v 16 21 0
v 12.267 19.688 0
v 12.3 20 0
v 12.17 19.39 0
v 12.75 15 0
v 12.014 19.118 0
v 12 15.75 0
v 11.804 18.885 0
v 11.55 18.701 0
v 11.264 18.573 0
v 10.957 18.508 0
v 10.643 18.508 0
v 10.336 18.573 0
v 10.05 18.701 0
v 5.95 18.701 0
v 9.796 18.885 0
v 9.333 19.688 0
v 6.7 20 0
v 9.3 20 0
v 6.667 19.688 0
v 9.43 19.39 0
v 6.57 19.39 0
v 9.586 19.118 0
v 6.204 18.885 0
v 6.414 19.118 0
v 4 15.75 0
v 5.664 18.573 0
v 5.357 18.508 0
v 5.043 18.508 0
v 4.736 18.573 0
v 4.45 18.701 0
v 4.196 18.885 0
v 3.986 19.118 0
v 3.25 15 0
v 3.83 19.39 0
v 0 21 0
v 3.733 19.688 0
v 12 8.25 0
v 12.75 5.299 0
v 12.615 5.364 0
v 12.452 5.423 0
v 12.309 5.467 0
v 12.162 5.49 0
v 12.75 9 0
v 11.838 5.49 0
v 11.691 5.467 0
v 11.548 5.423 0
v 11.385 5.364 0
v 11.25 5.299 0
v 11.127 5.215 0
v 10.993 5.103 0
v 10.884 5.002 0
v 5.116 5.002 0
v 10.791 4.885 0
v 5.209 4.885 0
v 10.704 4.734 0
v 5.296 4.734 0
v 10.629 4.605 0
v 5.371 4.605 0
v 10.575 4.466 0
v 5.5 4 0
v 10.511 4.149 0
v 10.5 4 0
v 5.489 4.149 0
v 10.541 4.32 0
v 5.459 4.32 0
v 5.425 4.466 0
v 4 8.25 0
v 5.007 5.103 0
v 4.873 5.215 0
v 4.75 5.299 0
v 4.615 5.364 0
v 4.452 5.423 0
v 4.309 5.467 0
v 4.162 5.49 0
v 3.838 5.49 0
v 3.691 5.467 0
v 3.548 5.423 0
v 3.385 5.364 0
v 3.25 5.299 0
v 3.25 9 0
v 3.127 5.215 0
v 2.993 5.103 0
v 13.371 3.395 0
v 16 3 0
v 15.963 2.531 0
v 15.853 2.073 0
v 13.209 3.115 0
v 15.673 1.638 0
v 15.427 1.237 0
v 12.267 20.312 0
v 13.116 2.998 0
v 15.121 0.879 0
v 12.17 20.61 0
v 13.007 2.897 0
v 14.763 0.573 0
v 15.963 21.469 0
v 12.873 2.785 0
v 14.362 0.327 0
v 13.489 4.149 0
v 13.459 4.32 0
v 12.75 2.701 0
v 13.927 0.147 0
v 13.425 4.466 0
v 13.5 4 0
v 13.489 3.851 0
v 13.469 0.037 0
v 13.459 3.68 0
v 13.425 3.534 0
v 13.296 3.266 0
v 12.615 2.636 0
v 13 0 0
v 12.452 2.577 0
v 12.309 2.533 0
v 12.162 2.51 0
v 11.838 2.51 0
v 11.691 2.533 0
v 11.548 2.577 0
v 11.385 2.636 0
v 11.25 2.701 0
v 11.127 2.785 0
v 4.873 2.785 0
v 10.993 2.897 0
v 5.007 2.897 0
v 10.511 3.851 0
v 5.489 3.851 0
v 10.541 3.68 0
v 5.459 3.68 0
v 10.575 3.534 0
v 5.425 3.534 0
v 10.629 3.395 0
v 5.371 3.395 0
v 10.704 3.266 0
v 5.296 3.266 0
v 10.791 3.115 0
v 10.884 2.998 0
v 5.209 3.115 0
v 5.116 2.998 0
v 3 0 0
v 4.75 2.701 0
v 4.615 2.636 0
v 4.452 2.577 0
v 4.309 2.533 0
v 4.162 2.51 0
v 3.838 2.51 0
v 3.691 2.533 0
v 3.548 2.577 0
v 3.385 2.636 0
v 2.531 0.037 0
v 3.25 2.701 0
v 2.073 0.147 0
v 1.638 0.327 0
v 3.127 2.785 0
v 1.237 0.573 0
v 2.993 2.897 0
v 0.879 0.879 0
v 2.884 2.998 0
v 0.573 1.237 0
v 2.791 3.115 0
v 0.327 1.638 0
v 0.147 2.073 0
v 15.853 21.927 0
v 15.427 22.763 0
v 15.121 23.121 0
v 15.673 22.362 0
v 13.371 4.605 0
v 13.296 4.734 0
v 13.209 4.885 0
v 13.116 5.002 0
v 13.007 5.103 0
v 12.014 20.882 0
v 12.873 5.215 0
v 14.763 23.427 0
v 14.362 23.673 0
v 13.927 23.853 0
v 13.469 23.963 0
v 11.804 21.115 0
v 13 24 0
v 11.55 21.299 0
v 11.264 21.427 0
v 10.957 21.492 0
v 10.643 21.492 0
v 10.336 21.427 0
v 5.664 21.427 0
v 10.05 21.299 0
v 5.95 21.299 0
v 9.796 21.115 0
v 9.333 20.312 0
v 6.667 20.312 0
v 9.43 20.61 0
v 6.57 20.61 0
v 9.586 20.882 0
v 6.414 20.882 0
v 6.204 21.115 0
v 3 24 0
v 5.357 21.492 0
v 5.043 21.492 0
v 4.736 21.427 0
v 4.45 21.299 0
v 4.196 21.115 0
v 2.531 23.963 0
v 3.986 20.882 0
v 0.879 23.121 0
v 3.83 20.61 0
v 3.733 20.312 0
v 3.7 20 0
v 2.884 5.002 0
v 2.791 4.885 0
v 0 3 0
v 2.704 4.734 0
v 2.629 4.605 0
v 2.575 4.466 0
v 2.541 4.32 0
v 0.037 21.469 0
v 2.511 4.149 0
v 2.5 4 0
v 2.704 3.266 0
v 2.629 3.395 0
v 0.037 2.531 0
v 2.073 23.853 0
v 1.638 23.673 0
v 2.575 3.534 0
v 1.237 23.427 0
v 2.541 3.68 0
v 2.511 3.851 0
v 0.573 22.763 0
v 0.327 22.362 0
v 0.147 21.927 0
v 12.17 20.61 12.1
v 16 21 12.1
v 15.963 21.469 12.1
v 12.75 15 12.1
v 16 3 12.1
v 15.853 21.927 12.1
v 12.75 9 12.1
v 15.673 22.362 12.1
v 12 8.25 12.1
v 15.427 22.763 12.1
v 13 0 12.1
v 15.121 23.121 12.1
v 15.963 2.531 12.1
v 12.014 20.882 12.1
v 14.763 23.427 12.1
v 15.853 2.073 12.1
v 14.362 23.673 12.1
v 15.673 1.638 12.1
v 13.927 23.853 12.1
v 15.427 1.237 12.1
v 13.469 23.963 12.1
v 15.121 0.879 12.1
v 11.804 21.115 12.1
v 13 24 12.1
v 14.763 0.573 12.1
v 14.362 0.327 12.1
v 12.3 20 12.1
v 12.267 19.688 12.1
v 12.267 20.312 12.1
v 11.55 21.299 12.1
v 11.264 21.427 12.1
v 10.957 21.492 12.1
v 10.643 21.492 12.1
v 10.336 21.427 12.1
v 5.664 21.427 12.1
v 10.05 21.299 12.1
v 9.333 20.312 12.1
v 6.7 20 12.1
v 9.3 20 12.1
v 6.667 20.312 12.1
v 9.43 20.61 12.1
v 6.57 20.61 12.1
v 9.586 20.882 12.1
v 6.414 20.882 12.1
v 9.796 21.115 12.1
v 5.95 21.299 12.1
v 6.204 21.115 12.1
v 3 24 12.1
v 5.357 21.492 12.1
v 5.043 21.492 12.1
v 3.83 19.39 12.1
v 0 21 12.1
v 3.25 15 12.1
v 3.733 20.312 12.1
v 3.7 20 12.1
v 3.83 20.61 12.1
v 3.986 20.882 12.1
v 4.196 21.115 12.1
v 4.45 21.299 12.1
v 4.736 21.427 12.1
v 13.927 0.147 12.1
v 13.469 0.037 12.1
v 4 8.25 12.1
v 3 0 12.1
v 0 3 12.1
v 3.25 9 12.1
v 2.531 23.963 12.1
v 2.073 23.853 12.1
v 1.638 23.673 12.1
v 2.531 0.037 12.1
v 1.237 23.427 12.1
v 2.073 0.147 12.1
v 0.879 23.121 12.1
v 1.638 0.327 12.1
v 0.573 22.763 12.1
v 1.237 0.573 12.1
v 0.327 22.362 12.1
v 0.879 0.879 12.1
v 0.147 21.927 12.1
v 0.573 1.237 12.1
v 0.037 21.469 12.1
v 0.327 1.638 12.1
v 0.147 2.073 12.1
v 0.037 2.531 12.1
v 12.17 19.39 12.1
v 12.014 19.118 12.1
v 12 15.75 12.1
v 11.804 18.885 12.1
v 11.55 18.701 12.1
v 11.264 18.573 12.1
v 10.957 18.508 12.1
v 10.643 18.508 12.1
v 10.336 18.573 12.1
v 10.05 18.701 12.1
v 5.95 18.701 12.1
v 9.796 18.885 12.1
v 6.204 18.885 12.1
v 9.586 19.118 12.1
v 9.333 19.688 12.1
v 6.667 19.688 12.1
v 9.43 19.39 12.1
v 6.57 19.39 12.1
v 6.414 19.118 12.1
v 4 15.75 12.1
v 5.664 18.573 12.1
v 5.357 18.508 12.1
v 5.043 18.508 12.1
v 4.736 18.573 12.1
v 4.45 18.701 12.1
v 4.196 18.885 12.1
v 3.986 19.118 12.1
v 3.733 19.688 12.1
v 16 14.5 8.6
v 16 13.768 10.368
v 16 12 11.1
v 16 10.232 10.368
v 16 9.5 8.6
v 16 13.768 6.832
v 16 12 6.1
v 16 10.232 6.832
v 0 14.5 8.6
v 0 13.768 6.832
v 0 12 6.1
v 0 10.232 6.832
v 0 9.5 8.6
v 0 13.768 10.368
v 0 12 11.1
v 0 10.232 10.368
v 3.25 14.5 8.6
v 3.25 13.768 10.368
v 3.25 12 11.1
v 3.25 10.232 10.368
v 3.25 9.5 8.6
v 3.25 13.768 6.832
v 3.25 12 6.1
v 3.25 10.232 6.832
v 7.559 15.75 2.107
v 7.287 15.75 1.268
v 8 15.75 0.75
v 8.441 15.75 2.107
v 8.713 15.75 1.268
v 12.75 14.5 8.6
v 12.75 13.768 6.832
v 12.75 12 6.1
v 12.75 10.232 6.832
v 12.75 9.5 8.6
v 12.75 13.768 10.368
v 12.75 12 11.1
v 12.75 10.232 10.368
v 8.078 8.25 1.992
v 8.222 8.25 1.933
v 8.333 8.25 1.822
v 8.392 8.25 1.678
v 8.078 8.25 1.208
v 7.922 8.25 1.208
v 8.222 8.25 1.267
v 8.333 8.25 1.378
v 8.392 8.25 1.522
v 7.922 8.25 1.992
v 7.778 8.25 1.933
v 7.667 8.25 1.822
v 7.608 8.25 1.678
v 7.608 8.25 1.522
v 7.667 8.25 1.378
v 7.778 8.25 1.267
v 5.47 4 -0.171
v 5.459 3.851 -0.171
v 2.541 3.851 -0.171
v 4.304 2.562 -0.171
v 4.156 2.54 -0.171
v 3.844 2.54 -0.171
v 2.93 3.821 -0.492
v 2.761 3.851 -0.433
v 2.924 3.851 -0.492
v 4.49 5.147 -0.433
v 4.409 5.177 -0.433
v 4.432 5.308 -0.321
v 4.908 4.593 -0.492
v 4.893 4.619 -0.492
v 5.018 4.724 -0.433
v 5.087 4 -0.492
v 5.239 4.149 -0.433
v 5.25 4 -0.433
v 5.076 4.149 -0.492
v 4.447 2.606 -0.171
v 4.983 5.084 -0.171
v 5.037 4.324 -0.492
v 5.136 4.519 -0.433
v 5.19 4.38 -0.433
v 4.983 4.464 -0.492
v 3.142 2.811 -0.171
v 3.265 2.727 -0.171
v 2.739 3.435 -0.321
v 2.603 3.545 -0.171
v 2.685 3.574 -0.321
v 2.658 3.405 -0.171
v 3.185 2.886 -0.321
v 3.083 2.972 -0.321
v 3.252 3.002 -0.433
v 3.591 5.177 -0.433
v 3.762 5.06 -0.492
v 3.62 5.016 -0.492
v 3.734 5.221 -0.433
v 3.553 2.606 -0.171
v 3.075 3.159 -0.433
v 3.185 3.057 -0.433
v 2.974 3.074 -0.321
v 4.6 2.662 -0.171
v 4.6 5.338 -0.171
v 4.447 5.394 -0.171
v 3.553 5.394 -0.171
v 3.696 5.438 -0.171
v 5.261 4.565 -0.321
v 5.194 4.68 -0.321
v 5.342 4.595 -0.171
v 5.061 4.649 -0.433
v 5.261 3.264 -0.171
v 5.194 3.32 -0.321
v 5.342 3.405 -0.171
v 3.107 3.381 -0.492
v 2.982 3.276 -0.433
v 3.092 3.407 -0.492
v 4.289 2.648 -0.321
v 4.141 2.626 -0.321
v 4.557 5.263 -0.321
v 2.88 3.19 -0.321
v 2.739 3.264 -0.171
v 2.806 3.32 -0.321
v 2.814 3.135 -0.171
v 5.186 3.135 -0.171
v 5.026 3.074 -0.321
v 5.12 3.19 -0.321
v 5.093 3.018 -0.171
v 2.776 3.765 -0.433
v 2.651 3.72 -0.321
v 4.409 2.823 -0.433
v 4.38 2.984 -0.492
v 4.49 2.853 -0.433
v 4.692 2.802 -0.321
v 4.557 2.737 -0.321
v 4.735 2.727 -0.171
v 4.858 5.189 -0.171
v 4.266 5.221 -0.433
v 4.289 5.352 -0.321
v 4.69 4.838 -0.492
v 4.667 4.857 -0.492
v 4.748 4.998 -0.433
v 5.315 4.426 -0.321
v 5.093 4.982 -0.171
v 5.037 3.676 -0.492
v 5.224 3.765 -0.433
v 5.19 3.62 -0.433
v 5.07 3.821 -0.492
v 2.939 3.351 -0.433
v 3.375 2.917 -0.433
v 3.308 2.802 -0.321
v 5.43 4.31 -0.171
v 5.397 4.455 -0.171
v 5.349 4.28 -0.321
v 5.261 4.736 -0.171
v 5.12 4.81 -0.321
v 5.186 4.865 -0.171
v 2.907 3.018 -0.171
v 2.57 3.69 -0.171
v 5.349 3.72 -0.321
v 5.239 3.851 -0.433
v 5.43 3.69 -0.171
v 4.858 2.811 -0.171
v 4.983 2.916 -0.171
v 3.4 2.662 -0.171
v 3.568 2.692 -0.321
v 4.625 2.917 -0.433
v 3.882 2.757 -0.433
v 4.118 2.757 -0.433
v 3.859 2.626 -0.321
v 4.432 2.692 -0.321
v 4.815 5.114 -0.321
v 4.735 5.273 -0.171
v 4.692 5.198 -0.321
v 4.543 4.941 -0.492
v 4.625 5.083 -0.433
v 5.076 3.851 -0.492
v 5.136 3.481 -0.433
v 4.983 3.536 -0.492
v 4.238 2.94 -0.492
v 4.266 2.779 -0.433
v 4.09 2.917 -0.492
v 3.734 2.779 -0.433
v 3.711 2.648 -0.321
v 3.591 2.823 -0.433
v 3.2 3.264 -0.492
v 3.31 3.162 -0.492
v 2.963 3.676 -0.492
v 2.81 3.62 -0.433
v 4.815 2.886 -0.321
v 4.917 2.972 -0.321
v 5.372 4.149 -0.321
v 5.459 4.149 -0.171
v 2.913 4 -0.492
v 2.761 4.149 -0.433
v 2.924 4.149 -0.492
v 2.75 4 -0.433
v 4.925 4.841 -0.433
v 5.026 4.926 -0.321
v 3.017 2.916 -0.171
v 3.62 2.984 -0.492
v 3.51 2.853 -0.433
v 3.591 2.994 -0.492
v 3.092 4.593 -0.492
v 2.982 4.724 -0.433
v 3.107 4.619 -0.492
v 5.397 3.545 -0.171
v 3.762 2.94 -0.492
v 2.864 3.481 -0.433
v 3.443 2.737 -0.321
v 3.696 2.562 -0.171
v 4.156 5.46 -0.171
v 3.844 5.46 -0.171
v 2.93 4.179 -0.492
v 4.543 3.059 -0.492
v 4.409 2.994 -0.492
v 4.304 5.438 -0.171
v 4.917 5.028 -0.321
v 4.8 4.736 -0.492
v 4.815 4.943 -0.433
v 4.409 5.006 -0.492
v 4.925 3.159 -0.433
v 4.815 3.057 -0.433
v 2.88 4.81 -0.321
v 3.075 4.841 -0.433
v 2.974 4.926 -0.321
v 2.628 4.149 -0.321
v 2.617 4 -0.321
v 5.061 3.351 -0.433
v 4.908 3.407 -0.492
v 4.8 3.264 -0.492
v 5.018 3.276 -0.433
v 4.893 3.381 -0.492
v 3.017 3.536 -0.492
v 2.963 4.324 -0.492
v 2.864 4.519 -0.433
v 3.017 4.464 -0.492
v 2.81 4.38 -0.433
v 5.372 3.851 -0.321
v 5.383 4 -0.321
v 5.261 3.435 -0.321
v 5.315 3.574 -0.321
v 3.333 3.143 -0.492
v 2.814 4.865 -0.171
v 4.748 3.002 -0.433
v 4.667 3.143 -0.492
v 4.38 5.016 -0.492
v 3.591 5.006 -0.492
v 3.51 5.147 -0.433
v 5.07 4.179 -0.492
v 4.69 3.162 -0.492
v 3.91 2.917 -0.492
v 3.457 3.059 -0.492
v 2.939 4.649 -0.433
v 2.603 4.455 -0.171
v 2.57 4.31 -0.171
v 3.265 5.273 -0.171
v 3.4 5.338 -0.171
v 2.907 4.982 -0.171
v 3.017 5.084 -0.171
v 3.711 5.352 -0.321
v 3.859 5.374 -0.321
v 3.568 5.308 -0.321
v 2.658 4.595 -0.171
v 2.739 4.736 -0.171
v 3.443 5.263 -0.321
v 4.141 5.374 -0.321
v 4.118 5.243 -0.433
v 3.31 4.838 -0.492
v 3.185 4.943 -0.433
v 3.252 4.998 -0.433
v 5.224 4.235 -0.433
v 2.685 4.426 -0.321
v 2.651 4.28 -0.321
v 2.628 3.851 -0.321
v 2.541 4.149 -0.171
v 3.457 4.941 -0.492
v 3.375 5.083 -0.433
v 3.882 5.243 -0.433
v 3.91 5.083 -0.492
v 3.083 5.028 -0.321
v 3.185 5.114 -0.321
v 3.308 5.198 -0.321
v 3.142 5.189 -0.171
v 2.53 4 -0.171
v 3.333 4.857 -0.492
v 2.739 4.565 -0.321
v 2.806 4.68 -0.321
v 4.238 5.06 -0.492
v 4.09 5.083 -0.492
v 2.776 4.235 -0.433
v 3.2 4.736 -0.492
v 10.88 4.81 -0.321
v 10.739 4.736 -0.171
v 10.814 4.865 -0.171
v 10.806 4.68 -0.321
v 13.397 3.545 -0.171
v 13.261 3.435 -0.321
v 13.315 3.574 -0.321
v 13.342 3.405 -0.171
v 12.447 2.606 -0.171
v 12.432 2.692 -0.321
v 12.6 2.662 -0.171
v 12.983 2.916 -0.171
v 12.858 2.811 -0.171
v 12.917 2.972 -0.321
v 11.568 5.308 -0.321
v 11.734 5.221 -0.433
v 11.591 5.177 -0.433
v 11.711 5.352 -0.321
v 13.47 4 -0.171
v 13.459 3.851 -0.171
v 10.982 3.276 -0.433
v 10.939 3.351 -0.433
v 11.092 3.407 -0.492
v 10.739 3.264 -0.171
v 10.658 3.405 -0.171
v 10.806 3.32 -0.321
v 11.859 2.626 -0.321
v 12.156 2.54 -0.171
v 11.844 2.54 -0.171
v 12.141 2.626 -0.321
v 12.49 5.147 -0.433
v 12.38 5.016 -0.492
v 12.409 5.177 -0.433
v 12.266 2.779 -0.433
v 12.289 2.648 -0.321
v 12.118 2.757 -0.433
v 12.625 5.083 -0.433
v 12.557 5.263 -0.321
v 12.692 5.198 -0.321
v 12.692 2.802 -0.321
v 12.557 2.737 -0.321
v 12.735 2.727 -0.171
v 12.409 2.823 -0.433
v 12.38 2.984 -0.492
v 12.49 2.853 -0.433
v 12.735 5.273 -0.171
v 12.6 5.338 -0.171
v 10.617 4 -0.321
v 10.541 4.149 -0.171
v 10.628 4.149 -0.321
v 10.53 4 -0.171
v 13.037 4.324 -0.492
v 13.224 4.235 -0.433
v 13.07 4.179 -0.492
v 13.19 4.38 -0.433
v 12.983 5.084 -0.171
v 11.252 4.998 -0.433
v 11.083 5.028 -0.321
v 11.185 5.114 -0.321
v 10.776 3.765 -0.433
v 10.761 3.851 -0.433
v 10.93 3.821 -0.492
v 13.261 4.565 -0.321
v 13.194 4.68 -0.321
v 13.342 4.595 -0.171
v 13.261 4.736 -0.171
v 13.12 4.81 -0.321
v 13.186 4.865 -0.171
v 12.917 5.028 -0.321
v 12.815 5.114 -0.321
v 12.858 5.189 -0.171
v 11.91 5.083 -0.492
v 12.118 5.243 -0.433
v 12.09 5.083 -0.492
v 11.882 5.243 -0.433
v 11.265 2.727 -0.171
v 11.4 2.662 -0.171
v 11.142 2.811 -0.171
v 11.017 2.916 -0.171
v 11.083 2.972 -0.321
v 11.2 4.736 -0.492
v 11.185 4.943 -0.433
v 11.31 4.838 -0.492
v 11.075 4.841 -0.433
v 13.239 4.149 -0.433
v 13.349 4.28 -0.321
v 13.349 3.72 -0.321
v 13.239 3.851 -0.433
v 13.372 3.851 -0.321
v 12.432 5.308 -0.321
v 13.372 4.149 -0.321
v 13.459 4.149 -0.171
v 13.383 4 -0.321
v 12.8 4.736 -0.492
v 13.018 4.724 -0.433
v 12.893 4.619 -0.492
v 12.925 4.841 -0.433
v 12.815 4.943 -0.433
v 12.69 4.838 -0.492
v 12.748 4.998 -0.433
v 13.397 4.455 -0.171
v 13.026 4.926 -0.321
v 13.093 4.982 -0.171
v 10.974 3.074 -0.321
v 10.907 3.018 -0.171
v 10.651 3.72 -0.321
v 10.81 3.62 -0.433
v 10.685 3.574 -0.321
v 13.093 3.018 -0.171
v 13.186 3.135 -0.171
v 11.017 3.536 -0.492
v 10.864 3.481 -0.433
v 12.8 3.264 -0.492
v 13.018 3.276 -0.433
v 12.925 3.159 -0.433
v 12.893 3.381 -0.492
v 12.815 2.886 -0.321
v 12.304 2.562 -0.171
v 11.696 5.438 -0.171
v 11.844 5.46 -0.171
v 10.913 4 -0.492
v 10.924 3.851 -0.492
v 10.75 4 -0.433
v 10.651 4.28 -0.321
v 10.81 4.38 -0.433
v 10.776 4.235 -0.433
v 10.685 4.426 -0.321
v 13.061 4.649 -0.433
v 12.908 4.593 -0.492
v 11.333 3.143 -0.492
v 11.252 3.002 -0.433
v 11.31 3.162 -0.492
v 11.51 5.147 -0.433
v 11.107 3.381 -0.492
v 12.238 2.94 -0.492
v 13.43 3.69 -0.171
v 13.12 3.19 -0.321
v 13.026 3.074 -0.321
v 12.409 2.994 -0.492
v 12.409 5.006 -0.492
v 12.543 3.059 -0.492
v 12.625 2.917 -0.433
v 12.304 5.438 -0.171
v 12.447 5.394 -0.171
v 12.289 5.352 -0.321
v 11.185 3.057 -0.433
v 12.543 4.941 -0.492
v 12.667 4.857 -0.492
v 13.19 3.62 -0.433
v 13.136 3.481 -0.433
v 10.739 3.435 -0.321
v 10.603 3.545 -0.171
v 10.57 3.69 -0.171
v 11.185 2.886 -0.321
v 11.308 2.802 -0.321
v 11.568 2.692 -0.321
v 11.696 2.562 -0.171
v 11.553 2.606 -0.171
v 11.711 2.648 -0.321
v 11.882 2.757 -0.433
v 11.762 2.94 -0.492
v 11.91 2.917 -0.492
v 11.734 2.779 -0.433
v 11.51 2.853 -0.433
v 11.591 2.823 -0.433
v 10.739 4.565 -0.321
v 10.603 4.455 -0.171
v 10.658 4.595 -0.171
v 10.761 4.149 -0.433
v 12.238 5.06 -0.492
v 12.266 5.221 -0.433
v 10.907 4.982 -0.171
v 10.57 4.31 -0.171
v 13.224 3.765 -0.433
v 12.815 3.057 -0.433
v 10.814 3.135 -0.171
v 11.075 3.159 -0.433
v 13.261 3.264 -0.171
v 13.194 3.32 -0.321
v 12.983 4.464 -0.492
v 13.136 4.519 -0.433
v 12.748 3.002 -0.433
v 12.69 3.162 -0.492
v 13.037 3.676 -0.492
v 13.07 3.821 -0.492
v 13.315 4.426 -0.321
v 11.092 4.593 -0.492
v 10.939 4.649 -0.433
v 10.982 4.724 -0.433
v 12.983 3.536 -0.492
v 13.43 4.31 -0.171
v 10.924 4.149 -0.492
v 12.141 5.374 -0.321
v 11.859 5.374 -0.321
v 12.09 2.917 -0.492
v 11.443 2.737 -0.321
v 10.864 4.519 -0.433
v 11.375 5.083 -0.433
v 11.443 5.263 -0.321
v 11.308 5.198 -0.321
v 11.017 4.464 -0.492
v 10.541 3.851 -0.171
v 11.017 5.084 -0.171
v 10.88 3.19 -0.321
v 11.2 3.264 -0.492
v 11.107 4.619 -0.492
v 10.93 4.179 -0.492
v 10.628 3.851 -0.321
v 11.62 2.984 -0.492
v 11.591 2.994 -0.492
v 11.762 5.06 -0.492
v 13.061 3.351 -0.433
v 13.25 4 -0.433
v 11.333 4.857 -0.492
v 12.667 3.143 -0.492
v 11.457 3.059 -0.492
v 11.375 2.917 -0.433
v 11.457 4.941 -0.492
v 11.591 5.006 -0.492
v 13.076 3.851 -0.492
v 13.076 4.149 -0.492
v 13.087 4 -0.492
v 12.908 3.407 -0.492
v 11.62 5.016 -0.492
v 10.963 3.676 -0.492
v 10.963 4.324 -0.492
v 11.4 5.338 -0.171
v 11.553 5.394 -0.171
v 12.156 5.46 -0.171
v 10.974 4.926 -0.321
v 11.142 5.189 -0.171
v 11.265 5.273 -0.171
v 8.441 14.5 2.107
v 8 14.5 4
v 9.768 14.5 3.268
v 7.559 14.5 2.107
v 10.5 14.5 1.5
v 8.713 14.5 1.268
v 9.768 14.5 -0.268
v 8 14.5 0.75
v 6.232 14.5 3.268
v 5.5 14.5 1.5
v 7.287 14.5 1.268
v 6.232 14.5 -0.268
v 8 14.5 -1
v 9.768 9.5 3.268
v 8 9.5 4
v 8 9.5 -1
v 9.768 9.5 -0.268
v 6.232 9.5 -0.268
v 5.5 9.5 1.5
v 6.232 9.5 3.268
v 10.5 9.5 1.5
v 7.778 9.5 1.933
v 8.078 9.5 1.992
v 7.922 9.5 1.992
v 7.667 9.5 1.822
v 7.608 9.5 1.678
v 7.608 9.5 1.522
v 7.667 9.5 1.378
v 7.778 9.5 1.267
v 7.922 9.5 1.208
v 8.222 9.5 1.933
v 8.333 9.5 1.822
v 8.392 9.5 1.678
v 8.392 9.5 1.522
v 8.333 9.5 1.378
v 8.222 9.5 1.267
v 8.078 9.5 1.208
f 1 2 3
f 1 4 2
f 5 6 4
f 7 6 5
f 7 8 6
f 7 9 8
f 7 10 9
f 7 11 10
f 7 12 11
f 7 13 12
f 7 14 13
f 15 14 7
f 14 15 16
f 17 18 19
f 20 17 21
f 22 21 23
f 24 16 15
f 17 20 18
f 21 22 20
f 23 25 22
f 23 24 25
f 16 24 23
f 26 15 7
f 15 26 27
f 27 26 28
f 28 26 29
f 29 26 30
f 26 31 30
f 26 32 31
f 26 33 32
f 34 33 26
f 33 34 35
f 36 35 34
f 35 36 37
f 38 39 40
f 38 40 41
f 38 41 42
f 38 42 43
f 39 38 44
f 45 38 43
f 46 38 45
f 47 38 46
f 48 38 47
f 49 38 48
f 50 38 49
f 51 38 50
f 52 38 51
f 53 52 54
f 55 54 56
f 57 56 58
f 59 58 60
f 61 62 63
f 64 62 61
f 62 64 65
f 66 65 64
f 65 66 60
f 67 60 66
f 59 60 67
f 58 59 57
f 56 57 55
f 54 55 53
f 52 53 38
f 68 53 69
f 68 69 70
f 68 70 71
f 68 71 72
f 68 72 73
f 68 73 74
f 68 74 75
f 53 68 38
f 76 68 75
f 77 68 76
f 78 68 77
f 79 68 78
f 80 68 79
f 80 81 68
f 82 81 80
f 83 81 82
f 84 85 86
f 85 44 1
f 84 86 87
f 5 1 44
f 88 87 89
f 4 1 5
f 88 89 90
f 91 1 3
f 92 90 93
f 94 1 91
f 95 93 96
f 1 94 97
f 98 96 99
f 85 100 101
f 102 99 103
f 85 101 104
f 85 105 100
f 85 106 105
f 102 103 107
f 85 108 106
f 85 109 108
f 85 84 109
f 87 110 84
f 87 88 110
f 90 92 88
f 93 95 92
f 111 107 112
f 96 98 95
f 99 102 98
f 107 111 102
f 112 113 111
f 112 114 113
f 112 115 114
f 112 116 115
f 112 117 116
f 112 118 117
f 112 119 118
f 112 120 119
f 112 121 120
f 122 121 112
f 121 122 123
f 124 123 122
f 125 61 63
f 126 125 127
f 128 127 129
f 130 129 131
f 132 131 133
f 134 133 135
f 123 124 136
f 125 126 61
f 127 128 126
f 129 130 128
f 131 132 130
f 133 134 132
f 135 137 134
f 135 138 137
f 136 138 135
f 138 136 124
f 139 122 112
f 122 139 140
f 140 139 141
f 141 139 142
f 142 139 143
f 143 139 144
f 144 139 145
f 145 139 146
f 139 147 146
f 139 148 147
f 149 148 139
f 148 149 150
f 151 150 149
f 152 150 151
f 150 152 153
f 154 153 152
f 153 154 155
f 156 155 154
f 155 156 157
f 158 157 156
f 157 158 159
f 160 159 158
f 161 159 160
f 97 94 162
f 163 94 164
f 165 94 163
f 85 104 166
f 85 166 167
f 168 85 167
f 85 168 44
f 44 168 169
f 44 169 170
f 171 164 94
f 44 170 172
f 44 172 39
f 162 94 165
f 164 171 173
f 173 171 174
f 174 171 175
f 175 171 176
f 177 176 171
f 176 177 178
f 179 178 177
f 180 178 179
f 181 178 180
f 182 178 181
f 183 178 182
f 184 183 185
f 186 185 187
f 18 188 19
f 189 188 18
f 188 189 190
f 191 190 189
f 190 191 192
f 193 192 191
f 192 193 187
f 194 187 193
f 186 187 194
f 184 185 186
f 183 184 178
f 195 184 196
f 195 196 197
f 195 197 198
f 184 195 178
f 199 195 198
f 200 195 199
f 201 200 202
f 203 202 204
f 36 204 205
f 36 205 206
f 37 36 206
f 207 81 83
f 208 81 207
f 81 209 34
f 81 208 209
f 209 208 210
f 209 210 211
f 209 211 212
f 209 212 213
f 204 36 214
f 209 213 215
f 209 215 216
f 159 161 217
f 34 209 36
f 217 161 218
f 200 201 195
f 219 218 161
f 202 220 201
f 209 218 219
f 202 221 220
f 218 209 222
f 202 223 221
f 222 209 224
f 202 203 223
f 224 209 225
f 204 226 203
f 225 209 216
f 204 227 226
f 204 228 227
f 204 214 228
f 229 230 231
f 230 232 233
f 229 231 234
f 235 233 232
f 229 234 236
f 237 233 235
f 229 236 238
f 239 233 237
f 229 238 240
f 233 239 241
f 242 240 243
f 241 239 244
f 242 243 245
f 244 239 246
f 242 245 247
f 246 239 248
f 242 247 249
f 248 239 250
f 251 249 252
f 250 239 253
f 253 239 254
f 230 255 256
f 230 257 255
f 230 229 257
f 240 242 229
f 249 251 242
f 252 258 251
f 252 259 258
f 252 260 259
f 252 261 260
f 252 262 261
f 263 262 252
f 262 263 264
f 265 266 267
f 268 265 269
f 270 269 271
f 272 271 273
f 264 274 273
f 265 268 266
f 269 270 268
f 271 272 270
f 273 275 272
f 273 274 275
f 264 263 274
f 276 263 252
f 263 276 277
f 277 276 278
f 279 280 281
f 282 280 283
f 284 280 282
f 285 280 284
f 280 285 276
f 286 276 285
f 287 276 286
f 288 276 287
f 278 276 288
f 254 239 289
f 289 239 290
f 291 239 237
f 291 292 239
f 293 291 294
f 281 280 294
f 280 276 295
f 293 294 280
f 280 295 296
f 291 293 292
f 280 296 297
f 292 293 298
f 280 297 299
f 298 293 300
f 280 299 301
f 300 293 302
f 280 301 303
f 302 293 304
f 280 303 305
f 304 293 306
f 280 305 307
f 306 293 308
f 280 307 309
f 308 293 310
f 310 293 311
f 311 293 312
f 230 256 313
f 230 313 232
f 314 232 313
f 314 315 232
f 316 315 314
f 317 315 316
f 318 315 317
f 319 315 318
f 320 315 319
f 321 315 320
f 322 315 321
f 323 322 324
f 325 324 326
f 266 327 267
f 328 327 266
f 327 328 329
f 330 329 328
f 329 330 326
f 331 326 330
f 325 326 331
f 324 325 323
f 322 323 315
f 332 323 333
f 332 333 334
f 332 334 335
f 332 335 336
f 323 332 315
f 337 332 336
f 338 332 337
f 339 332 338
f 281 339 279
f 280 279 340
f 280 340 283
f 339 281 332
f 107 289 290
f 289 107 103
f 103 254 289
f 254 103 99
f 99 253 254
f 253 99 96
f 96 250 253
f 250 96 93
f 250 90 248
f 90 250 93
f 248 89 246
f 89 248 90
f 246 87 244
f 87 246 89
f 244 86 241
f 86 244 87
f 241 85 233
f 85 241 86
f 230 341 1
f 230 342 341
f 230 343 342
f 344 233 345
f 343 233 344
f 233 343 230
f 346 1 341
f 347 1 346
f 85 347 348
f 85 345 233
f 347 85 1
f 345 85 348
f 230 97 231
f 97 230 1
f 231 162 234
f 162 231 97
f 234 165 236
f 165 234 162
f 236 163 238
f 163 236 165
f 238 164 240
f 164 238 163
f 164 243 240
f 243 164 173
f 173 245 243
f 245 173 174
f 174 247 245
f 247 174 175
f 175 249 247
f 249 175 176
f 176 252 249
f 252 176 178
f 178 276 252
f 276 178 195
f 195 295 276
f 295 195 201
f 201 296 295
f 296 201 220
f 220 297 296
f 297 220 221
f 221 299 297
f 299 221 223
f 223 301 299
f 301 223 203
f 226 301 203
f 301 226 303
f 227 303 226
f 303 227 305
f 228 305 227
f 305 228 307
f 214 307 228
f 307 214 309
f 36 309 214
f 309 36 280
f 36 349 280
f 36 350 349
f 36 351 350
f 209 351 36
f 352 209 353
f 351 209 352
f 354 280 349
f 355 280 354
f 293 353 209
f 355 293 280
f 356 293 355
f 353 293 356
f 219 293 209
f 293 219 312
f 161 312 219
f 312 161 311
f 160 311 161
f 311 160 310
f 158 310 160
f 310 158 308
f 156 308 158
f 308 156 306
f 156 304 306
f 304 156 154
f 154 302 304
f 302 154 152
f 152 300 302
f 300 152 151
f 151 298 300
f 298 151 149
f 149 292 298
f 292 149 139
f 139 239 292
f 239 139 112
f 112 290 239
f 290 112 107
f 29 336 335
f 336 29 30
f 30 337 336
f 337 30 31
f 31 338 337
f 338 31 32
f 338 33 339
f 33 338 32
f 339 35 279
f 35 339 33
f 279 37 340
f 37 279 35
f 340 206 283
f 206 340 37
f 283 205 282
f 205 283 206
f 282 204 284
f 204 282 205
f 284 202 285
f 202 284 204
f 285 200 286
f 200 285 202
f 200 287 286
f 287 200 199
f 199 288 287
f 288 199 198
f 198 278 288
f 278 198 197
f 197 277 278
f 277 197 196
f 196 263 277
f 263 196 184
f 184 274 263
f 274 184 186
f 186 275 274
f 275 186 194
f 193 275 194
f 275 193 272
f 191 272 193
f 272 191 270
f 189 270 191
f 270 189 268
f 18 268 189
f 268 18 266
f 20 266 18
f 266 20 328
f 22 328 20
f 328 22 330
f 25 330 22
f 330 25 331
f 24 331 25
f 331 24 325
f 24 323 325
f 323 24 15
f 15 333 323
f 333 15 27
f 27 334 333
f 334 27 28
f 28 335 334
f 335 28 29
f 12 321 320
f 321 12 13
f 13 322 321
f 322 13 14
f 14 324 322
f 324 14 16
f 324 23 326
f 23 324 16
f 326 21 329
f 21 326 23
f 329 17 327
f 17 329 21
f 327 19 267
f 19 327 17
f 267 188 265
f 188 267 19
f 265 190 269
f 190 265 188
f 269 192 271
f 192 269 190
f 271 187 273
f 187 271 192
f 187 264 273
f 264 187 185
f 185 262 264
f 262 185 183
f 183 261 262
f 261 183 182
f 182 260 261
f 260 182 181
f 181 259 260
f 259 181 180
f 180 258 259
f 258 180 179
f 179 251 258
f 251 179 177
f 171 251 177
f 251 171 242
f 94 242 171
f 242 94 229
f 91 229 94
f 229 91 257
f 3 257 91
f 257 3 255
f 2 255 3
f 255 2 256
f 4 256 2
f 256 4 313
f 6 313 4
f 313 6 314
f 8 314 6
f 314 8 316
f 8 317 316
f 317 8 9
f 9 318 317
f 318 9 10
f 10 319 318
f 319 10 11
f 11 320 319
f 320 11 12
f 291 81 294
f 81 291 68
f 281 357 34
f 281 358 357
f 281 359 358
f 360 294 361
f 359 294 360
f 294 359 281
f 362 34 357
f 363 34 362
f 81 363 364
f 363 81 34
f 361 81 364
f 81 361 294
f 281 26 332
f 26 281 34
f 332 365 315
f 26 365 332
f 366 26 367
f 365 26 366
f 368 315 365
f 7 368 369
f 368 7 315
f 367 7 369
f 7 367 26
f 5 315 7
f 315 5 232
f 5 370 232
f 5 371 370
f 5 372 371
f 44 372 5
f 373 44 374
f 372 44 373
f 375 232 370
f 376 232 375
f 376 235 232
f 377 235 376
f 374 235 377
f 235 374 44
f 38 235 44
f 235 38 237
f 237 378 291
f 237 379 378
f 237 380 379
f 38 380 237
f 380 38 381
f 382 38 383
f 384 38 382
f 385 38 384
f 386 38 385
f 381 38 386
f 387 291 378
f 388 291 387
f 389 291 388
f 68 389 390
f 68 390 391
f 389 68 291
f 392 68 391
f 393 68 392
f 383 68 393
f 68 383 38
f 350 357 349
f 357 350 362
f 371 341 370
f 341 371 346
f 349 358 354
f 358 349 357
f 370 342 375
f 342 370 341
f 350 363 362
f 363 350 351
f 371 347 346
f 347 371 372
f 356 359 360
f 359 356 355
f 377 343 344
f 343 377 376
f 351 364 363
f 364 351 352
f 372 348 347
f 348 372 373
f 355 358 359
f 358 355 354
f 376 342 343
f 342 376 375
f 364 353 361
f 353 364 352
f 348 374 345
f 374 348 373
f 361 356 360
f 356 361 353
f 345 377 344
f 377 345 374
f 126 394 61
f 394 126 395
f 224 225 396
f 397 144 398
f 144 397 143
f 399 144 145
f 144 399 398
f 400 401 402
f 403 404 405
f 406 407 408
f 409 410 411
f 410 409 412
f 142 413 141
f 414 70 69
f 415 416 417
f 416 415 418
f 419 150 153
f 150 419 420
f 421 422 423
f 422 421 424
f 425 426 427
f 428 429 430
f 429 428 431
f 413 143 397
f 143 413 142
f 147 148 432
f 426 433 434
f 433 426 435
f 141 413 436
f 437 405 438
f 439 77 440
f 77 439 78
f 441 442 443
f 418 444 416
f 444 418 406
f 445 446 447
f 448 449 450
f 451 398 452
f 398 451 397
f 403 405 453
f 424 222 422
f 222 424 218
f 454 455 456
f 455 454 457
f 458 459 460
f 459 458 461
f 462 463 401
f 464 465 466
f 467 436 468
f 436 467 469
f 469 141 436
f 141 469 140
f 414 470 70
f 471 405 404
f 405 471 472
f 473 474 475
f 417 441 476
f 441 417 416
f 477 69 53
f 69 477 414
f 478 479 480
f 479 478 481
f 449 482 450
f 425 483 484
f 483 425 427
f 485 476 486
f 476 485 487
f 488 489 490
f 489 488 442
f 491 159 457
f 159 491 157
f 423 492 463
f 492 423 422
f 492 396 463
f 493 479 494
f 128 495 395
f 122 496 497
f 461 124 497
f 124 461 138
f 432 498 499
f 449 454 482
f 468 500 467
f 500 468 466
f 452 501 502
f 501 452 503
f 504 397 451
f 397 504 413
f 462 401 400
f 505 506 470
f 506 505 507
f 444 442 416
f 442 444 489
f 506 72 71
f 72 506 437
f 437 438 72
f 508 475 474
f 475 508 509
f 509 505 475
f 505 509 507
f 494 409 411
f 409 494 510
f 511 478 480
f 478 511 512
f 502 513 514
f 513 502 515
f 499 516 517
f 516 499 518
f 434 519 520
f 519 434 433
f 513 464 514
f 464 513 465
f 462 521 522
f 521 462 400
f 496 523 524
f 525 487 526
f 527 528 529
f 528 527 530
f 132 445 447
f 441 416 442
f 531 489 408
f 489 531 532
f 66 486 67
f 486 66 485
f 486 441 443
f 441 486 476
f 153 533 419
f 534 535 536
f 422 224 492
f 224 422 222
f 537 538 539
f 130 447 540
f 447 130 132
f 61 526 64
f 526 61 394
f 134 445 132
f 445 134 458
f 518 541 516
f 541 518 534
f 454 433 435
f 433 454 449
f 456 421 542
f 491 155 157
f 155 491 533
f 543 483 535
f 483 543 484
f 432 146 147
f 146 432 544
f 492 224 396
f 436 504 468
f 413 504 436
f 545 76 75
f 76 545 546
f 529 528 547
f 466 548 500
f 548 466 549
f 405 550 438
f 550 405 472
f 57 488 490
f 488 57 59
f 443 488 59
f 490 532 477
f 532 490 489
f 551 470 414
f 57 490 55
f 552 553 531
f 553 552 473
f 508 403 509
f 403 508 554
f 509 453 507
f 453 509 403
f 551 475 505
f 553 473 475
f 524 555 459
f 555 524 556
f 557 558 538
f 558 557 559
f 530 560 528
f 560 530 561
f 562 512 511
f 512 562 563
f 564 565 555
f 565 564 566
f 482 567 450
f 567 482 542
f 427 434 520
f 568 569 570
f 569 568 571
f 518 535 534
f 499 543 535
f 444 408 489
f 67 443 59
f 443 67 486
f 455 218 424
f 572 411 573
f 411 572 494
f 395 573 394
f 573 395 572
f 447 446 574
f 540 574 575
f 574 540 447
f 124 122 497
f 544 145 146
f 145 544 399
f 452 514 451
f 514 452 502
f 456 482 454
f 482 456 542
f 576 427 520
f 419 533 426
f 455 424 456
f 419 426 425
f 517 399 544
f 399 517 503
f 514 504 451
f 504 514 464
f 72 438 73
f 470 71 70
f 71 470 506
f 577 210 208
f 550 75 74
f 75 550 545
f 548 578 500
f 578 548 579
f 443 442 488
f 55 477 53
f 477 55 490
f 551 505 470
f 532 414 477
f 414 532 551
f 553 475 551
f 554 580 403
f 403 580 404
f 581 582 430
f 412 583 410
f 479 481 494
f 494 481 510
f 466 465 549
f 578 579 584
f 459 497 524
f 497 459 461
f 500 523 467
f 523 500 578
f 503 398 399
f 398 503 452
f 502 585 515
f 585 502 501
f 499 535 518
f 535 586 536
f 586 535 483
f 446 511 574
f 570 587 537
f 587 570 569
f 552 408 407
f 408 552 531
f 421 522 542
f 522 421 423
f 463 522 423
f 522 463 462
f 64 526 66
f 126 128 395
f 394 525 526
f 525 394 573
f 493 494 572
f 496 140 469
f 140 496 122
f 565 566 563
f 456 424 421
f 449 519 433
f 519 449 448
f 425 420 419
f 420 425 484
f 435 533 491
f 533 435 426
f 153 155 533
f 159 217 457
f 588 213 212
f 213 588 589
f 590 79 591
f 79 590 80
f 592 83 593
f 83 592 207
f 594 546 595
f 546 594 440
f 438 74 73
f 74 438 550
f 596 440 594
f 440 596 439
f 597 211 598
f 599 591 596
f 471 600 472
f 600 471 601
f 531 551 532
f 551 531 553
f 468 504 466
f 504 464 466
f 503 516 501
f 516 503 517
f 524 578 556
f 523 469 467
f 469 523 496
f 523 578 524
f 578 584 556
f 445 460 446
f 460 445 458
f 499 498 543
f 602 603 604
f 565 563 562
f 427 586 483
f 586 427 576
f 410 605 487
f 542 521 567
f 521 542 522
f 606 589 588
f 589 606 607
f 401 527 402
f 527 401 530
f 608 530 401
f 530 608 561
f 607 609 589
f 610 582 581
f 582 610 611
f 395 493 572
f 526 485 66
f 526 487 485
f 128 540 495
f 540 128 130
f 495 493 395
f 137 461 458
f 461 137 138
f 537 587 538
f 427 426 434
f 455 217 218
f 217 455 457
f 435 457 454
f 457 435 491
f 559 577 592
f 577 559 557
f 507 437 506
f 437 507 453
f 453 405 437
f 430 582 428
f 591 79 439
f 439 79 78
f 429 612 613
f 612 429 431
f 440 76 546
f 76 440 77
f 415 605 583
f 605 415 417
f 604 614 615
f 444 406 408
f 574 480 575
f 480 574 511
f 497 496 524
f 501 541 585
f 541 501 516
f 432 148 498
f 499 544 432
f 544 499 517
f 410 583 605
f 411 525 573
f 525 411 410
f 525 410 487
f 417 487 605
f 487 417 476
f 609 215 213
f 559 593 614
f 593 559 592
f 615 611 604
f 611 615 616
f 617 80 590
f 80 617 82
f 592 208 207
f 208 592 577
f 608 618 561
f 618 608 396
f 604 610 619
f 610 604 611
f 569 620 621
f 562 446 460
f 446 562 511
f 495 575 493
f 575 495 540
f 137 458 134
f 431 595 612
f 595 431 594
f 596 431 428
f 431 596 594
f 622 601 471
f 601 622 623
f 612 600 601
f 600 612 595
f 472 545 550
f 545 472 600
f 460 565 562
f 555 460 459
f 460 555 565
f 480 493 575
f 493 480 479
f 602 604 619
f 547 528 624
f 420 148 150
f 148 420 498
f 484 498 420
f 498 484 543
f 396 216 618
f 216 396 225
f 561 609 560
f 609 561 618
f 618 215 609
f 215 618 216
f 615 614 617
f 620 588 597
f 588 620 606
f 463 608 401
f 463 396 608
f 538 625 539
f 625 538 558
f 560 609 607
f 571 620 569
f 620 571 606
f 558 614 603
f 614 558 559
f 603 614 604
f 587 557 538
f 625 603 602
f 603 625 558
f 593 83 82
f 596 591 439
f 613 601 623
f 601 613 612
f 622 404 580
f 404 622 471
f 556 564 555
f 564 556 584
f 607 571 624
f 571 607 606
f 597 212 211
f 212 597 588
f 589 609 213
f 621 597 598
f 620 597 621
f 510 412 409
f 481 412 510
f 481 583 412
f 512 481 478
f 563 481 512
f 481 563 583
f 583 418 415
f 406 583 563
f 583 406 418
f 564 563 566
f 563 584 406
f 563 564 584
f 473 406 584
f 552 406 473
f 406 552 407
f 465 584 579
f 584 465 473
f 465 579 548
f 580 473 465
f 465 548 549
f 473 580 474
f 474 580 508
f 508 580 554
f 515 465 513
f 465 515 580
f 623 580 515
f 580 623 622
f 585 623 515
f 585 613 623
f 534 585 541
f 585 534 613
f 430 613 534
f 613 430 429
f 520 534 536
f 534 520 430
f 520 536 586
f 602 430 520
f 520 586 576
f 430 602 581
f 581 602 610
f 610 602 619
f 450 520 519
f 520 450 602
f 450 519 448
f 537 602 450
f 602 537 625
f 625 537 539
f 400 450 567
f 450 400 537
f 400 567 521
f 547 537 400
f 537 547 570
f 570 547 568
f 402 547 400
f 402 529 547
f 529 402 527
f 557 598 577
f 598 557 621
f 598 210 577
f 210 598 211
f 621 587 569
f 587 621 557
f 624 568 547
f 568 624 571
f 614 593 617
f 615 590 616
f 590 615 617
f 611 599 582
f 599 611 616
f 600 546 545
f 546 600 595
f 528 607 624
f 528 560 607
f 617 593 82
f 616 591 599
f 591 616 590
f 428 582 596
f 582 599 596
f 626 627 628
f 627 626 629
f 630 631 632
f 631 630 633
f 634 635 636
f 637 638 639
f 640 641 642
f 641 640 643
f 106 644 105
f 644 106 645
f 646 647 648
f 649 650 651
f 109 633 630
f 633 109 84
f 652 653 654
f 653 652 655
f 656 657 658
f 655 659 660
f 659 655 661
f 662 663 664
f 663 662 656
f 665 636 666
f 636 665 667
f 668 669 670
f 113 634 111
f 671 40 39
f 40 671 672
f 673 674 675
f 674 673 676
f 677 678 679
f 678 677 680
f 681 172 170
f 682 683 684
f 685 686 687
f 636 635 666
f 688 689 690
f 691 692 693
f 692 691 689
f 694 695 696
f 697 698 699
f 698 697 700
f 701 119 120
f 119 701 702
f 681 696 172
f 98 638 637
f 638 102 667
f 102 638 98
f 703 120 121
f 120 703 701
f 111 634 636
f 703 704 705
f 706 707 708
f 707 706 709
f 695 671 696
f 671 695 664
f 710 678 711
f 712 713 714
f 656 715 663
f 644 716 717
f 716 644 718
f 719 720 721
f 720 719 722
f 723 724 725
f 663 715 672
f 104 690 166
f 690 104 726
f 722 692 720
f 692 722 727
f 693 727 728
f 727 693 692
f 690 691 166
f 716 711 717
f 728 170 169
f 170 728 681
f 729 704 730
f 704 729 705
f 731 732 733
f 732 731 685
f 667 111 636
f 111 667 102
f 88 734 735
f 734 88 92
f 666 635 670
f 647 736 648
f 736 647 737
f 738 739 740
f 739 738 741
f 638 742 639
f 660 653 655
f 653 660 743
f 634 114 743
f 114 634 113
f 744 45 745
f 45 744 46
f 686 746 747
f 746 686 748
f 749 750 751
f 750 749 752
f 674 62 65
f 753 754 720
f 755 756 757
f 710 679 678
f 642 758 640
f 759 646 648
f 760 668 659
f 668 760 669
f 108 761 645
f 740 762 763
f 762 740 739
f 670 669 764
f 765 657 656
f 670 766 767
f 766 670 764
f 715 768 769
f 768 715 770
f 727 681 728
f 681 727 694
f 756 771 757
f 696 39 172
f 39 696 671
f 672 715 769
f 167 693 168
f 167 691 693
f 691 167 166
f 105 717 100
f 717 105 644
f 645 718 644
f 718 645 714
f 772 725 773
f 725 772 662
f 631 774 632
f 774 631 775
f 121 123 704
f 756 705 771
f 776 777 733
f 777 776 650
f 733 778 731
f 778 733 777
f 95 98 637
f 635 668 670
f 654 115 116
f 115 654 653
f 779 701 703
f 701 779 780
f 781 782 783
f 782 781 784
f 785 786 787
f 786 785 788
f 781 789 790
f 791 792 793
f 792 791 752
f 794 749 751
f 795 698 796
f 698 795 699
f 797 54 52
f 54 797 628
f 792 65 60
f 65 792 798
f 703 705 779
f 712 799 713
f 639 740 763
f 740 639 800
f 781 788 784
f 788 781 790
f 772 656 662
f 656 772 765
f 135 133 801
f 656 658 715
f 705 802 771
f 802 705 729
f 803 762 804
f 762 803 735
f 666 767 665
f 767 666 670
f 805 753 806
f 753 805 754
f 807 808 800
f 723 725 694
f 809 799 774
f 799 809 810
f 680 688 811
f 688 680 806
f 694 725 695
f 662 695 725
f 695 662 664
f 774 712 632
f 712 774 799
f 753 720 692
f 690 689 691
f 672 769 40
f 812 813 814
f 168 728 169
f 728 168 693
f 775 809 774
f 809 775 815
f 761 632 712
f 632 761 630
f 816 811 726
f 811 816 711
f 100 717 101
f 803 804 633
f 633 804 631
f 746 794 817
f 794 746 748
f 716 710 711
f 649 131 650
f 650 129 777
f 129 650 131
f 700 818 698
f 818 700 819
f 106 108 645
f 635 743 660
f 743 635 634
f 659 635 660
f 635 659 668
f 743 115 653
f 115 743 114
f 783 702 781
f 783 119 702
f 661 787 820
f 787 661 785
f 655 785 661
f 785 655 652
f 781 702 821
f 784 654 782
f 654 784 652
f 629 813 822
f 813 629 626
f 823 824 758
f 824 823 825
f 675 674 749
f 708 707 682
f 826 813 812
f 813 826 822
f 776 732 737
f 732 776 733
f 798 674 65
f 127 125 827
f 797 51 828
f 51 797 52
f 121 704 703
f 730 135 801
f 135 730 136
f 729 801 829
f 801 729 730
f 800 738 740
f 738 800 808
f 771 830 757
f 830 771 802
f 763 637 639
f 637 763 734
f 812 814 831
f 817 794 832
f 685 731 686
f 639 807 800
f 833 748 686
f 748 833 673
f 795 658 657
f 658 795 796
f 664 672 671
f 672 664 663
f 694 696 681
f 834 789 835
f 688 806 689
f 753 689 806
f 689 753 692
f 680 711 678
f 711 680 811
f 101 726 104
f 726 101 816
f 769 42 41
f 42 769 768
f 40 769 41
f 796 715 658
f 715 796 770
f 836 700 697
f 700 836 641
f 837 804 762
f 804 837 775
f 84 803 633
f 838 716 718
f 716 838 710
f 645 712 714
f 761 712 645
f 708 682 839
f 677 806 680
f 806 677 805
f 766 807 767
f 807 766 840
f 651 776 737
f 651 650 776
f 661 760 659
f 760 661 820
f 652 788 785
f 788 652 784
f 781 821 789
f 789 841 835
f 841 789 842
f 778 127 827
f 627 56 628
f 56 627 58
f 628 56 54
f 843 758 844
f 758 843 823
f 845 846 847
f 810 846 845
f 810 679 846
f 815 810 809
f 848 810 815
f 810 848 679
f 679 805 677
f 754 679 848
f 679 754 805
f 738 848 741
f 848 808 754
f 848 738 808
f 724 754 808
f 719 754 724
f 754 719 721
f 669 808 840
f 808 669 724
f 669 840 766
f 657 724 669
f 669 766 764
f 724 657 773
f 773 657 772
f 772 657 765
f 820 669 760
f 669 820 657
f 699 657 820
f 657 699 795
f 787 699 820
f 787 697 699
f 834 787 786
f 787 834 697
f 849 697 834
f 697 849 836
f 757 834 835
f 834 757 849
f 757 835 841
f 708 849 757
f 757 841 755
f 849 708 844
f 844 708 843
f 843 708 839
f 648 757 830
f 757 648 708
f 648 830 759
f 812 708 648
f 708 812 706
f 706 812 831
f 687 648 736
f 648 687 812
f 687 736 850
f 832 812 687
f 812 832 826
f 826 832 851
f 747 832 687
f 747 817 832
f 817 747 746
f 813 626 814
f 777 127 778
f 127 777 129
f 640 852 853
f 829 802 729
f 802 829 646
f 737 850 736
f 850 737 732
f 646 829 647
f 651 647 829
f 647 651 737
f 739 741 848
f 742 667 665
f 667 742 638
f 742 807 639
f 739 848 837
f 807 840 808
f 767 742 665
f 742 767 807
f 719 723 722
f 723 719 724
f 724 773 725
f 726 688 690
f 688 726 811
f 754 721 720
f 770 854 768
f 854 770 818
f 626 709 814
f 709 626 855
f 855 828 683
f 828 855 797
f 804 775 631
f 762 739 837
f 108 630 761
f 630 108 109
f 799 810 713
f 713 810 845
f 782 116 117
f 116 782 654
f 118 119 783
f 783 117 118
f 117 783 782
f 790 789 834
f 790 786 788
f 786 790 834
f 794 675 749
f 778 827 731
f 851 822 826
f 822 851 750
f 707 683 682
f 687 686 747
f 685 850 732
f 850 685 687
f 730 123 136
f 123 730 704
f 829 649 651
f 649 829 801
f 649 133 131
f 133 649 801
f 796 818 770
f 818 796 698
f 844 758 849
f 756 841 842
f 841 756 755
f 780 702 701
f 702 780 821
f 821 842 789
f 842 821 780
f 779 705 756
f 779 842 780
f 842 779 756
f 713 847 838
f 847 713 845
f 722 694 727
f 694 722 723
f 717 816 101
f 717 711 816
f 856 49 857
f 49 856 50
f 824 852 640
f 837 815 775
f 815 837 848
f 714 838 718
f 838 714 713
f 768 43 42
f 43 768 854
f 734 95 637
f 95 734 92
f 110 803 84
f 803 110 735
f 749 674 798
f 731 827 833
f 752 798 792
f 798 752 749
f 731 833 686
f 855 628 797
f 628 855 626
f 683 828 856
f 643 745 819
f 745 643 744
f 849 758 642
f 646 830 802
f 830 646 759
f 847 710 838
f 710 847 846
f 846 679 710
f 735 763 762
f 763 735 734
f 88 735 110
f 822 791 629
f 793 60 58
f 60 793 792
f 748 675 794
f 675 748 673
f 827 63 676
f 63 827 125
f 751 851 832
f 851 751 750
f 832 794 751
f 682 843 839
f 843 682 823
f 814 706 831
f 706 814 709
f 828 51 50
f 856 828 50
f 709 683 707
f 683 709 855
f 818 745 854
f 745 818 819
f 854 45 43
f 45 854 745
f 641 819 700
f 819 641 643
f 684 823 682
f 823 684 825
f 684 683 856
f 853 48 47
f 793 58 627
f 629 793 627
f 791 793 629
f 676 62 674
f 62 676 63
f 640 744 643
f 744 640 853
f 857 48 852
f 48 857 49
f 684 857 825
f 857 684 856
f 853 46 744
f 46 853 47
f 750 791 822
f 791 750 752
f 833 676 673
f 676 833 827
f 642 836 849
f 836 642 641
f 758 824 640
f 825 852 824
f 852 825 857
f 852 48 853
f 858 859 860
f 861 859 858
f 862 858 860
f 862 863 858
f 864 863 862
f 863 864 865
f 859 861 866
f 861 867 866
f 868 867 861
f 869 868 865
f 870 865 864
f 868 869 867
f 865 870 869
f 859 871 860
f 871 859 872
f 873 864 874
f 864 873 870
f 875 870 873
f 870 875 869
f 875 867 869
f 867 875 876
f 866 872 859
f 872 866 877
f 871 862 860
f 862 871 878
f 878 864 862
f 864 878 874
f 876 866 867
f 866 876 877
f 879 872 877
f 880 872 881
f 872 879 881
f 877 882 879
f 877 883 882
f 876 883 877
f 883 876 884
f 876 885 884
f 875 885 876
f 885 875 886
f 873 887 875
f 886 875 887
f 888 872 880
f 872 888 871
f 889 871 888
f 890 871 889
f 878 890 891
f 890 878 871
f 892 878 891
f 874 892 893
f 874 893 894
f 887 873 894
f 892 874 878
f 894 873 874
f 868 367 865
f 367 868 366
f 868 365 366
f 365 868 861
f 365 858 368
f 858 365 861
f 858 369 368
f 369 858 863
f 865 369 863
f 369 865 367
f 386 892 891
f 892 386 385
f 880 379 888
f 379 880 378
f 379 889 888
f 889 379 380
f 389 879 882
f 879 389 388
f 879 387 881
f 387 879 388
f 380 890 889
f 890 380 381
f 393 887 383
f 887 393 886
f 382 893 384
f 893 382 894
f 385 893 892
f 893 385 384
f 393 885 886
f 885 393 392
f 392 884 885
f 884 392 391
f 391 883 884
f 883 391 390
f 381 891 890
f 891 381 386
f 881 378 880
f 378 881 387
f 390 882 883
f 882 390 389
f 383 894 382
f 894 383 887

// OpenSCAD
// file: ../parts/b16_rivet.scad
// part_id: b16
// name: B16 rivet pin
// source_drawing_ids: DRW-002
// units: mm
// revision: 0.1
// SPDX-License-Identifier: MIT

module part_b16(pin_d = 2.0, pin_h = 3.0, head_d = 2.8, head_h = 1.0, tip_angle = 10) {
    union() {
        cylinder(d = pin_d, h = pin_h, center = false, $fn = 30);
        cylinder(d = head_d, h = head_h, center = false, $fn = 30);
        translate([0, 0, pin_h]) cylinder(d1 = pin_d, d2 = 0.8, h = 0.8, center = false, $fn = 24);
    }
}
// file: ../parts/b15_wire_link.scad
// part_id: b15
// name: B15 wire link
// source_drawing_ids: DRW-002
// units: mm
// revision: 0.1
// SPDX-License-Identifier: MIT

module wire_segment(a = [0, 0, 0], b = [10, 0, 0], d = 0.8) {
    hull() {
        translate(a) sphere(d = d, $fn = 16);
        translate(b) sphere(d = d, $fn = 16);
    }
}

module part_b15(run = 17, drop = 4, wire_d = 0.8) {
    // Bent wire with short return hooks at ends.
    union() {
        wire_segment([0, 0, 0], [run, 0, 0], wire_d);
        wire_segment([0, 0, 0], [-2.2, 0, -1.2], wire_d);
        wire_segment([run, 0, 0], [run + 2.2, 0, 1.2], wire_d);
    }
}

// ---- "main guard" ----
// Default to previewing when opened directly:
if (is_undef(__LIB_MODE__)) {
    part_b15();
}
// file: ../parts/b14_pin.scad
// part_id: b14
// name: B14 pin
// source_drawing_ids: DRW-002
// units: mm
// revision: 0.1
// SPDX-License-Identifier: MIT

module part_b14(d = 1.5, h = 5.0) {
    cylinder(d = d, h = h, center = false, $fn = 30);
}
// file: ../parts/b13_roller.scad
// part_id: b13
// name: B13 roller/stub axle
// source_drawing_ids: DRW-002
// units: mm
// revision: 0.1
// SPDX-License-Identifier: MIT

module part_b13(roller_d = 5.0, roller_len = 5.0, pin_d = 1.5, pin_len = 1.8) {
    union() {
        rotate([0, 90, 0]) cylinder(d = roller_d, h = roller_len, center = false);
        translate([roller_len, 0, 0]) rotate([0, 90, 0]) cylinder(d = pin_d, h = pin_len, center = false);
    }
}
// file: ../parts/b12_pin.scad
// part_id: b12
// name: B12 pin
// source_drawing_ids: DRW-002
// units: mm
// revision: 0.1
// SPDX-License-Identifier: MIT

module part_b12(d = 3.0, h = 9.0, edge_r = 0.5) {
    // Slightly softened cylinder for press/rivet pin visual.
    minkowski() {
        cylinder(d = d - 2 * edge_r, h = h - 2 * edge_r, center = false, $fn = 42);
        sphere(r = edge_r, $fn = 18);
    }
}
// file: ../parts/b11_carrier_block.scad
// part_id: b11
// name: B11 carrier block
// source_drawing_ids: DRW-002
// units: mm
// revision: 0.1
// SPDX-License-Identifier: MIT

module b11_profile_2d(w = 16, h = 24, corner_r = 3) {
    difference() {
        hull() {
            translate([corner_r, corner_r]) circle(r = corner_r, $fn = 40);
            translate([w - corner_r, corner_r]) circle(r = corner_r, $fn = 40);
            translate([corner_r, h - corner_r]) circle(r = corner_r, $fn = 40);
            translate([w - corner_r, h - corner_r]) circle(r = corner_r, $fn = 40);
        }
        // Center window
        translate([w / 2 - 4, h / 2 - 3]) offset(r = 0.75) square([8, 6], center = false);
        // Twin top holes
        for (x = [w / 2 - 2.8, w / 2 + 2.8]) translate([x, h - 4]) circle(d = 3.0, $fn = 30);
        // Through axis hole
        translate([w / 2, h / 2]) circle(d = 3.0, $fn = 30);
    }
}

module part_b11(w = 16, h = 24, t = 12.1) {
    difference() {
        linear_extrude(height = t)
            b11_profile_2d(w = w, h = h);

        // Side shaft bore for b13.
        translate([w / 2, h / 2, t - 3.5])
            rotate([0, 90, 0])
                cylinder(d = 5.0, h = w + 0.4, center = true);
    }
}

// ---- "main guard" ----
// Default to previewing when opened directly:
if (is_undef(__LIB_MODE__)) {
    part_b11();
}
// main file
// DRW-002 b9 subassembly recreation (b11+b12+b13+b14+b15+b16).
// SPDX-License-Identifier: MIT

use <../parts/b11_carrier_block.scad>
use <../parts/b12_pin.scad>
use <../parts/b13_roller.scad>
use <../parts/b14_pin.scad>
use <../parts/b15_wire_link.scad>
use <../parts/b16_rivet.scad>

module drw002_b9_subassembly() {
    // Core block.
    color([0.40, 0.29, 0.19]) translate([0, 0, 0]) part_b11();

    // Two b12 guide pins through the large face holes.
    color([0.45, 0.34, 0.23]) {
        translate([4.0, 4.0, 0]) part_b12();
        translate([12.0, 4.0, 0]) part_b12();
    }

    // b13 roller crossing the center window.
    color([0.70, 0.70, 0.70])
        translate([8.0, 12.0, 1.5])
            rotate([0, 0, 90])
                translate([-2.5, 0, 0])
                    part_b13();

    // b16 rivet through the lower small face hole.
    color([0.25, 0.25, 0.25])
        translate([8.0, 21.5, 0])
            part_b16();

    // Wire link centered in the groove.
    color([0.72, 0.72, 0.72])
        translate([8.0, 3.5, 1.6])
            rotate([0, 0, 90])
                part_b15();

    // Placeholder rivet from b17 callout region used in sheet view.
    color([0.15, 0.15, 0.15])
        translate([8.0, 4.0, 0])
            cylinder(d = 1.5, h = 2.0, center = false, $fn = 24);
}

// ---- "main guard" ----
// Default to previewing when opened directly:
if (is_undef(__LIB_MODE__)) {
    drw002_b9_subassembly();
}
